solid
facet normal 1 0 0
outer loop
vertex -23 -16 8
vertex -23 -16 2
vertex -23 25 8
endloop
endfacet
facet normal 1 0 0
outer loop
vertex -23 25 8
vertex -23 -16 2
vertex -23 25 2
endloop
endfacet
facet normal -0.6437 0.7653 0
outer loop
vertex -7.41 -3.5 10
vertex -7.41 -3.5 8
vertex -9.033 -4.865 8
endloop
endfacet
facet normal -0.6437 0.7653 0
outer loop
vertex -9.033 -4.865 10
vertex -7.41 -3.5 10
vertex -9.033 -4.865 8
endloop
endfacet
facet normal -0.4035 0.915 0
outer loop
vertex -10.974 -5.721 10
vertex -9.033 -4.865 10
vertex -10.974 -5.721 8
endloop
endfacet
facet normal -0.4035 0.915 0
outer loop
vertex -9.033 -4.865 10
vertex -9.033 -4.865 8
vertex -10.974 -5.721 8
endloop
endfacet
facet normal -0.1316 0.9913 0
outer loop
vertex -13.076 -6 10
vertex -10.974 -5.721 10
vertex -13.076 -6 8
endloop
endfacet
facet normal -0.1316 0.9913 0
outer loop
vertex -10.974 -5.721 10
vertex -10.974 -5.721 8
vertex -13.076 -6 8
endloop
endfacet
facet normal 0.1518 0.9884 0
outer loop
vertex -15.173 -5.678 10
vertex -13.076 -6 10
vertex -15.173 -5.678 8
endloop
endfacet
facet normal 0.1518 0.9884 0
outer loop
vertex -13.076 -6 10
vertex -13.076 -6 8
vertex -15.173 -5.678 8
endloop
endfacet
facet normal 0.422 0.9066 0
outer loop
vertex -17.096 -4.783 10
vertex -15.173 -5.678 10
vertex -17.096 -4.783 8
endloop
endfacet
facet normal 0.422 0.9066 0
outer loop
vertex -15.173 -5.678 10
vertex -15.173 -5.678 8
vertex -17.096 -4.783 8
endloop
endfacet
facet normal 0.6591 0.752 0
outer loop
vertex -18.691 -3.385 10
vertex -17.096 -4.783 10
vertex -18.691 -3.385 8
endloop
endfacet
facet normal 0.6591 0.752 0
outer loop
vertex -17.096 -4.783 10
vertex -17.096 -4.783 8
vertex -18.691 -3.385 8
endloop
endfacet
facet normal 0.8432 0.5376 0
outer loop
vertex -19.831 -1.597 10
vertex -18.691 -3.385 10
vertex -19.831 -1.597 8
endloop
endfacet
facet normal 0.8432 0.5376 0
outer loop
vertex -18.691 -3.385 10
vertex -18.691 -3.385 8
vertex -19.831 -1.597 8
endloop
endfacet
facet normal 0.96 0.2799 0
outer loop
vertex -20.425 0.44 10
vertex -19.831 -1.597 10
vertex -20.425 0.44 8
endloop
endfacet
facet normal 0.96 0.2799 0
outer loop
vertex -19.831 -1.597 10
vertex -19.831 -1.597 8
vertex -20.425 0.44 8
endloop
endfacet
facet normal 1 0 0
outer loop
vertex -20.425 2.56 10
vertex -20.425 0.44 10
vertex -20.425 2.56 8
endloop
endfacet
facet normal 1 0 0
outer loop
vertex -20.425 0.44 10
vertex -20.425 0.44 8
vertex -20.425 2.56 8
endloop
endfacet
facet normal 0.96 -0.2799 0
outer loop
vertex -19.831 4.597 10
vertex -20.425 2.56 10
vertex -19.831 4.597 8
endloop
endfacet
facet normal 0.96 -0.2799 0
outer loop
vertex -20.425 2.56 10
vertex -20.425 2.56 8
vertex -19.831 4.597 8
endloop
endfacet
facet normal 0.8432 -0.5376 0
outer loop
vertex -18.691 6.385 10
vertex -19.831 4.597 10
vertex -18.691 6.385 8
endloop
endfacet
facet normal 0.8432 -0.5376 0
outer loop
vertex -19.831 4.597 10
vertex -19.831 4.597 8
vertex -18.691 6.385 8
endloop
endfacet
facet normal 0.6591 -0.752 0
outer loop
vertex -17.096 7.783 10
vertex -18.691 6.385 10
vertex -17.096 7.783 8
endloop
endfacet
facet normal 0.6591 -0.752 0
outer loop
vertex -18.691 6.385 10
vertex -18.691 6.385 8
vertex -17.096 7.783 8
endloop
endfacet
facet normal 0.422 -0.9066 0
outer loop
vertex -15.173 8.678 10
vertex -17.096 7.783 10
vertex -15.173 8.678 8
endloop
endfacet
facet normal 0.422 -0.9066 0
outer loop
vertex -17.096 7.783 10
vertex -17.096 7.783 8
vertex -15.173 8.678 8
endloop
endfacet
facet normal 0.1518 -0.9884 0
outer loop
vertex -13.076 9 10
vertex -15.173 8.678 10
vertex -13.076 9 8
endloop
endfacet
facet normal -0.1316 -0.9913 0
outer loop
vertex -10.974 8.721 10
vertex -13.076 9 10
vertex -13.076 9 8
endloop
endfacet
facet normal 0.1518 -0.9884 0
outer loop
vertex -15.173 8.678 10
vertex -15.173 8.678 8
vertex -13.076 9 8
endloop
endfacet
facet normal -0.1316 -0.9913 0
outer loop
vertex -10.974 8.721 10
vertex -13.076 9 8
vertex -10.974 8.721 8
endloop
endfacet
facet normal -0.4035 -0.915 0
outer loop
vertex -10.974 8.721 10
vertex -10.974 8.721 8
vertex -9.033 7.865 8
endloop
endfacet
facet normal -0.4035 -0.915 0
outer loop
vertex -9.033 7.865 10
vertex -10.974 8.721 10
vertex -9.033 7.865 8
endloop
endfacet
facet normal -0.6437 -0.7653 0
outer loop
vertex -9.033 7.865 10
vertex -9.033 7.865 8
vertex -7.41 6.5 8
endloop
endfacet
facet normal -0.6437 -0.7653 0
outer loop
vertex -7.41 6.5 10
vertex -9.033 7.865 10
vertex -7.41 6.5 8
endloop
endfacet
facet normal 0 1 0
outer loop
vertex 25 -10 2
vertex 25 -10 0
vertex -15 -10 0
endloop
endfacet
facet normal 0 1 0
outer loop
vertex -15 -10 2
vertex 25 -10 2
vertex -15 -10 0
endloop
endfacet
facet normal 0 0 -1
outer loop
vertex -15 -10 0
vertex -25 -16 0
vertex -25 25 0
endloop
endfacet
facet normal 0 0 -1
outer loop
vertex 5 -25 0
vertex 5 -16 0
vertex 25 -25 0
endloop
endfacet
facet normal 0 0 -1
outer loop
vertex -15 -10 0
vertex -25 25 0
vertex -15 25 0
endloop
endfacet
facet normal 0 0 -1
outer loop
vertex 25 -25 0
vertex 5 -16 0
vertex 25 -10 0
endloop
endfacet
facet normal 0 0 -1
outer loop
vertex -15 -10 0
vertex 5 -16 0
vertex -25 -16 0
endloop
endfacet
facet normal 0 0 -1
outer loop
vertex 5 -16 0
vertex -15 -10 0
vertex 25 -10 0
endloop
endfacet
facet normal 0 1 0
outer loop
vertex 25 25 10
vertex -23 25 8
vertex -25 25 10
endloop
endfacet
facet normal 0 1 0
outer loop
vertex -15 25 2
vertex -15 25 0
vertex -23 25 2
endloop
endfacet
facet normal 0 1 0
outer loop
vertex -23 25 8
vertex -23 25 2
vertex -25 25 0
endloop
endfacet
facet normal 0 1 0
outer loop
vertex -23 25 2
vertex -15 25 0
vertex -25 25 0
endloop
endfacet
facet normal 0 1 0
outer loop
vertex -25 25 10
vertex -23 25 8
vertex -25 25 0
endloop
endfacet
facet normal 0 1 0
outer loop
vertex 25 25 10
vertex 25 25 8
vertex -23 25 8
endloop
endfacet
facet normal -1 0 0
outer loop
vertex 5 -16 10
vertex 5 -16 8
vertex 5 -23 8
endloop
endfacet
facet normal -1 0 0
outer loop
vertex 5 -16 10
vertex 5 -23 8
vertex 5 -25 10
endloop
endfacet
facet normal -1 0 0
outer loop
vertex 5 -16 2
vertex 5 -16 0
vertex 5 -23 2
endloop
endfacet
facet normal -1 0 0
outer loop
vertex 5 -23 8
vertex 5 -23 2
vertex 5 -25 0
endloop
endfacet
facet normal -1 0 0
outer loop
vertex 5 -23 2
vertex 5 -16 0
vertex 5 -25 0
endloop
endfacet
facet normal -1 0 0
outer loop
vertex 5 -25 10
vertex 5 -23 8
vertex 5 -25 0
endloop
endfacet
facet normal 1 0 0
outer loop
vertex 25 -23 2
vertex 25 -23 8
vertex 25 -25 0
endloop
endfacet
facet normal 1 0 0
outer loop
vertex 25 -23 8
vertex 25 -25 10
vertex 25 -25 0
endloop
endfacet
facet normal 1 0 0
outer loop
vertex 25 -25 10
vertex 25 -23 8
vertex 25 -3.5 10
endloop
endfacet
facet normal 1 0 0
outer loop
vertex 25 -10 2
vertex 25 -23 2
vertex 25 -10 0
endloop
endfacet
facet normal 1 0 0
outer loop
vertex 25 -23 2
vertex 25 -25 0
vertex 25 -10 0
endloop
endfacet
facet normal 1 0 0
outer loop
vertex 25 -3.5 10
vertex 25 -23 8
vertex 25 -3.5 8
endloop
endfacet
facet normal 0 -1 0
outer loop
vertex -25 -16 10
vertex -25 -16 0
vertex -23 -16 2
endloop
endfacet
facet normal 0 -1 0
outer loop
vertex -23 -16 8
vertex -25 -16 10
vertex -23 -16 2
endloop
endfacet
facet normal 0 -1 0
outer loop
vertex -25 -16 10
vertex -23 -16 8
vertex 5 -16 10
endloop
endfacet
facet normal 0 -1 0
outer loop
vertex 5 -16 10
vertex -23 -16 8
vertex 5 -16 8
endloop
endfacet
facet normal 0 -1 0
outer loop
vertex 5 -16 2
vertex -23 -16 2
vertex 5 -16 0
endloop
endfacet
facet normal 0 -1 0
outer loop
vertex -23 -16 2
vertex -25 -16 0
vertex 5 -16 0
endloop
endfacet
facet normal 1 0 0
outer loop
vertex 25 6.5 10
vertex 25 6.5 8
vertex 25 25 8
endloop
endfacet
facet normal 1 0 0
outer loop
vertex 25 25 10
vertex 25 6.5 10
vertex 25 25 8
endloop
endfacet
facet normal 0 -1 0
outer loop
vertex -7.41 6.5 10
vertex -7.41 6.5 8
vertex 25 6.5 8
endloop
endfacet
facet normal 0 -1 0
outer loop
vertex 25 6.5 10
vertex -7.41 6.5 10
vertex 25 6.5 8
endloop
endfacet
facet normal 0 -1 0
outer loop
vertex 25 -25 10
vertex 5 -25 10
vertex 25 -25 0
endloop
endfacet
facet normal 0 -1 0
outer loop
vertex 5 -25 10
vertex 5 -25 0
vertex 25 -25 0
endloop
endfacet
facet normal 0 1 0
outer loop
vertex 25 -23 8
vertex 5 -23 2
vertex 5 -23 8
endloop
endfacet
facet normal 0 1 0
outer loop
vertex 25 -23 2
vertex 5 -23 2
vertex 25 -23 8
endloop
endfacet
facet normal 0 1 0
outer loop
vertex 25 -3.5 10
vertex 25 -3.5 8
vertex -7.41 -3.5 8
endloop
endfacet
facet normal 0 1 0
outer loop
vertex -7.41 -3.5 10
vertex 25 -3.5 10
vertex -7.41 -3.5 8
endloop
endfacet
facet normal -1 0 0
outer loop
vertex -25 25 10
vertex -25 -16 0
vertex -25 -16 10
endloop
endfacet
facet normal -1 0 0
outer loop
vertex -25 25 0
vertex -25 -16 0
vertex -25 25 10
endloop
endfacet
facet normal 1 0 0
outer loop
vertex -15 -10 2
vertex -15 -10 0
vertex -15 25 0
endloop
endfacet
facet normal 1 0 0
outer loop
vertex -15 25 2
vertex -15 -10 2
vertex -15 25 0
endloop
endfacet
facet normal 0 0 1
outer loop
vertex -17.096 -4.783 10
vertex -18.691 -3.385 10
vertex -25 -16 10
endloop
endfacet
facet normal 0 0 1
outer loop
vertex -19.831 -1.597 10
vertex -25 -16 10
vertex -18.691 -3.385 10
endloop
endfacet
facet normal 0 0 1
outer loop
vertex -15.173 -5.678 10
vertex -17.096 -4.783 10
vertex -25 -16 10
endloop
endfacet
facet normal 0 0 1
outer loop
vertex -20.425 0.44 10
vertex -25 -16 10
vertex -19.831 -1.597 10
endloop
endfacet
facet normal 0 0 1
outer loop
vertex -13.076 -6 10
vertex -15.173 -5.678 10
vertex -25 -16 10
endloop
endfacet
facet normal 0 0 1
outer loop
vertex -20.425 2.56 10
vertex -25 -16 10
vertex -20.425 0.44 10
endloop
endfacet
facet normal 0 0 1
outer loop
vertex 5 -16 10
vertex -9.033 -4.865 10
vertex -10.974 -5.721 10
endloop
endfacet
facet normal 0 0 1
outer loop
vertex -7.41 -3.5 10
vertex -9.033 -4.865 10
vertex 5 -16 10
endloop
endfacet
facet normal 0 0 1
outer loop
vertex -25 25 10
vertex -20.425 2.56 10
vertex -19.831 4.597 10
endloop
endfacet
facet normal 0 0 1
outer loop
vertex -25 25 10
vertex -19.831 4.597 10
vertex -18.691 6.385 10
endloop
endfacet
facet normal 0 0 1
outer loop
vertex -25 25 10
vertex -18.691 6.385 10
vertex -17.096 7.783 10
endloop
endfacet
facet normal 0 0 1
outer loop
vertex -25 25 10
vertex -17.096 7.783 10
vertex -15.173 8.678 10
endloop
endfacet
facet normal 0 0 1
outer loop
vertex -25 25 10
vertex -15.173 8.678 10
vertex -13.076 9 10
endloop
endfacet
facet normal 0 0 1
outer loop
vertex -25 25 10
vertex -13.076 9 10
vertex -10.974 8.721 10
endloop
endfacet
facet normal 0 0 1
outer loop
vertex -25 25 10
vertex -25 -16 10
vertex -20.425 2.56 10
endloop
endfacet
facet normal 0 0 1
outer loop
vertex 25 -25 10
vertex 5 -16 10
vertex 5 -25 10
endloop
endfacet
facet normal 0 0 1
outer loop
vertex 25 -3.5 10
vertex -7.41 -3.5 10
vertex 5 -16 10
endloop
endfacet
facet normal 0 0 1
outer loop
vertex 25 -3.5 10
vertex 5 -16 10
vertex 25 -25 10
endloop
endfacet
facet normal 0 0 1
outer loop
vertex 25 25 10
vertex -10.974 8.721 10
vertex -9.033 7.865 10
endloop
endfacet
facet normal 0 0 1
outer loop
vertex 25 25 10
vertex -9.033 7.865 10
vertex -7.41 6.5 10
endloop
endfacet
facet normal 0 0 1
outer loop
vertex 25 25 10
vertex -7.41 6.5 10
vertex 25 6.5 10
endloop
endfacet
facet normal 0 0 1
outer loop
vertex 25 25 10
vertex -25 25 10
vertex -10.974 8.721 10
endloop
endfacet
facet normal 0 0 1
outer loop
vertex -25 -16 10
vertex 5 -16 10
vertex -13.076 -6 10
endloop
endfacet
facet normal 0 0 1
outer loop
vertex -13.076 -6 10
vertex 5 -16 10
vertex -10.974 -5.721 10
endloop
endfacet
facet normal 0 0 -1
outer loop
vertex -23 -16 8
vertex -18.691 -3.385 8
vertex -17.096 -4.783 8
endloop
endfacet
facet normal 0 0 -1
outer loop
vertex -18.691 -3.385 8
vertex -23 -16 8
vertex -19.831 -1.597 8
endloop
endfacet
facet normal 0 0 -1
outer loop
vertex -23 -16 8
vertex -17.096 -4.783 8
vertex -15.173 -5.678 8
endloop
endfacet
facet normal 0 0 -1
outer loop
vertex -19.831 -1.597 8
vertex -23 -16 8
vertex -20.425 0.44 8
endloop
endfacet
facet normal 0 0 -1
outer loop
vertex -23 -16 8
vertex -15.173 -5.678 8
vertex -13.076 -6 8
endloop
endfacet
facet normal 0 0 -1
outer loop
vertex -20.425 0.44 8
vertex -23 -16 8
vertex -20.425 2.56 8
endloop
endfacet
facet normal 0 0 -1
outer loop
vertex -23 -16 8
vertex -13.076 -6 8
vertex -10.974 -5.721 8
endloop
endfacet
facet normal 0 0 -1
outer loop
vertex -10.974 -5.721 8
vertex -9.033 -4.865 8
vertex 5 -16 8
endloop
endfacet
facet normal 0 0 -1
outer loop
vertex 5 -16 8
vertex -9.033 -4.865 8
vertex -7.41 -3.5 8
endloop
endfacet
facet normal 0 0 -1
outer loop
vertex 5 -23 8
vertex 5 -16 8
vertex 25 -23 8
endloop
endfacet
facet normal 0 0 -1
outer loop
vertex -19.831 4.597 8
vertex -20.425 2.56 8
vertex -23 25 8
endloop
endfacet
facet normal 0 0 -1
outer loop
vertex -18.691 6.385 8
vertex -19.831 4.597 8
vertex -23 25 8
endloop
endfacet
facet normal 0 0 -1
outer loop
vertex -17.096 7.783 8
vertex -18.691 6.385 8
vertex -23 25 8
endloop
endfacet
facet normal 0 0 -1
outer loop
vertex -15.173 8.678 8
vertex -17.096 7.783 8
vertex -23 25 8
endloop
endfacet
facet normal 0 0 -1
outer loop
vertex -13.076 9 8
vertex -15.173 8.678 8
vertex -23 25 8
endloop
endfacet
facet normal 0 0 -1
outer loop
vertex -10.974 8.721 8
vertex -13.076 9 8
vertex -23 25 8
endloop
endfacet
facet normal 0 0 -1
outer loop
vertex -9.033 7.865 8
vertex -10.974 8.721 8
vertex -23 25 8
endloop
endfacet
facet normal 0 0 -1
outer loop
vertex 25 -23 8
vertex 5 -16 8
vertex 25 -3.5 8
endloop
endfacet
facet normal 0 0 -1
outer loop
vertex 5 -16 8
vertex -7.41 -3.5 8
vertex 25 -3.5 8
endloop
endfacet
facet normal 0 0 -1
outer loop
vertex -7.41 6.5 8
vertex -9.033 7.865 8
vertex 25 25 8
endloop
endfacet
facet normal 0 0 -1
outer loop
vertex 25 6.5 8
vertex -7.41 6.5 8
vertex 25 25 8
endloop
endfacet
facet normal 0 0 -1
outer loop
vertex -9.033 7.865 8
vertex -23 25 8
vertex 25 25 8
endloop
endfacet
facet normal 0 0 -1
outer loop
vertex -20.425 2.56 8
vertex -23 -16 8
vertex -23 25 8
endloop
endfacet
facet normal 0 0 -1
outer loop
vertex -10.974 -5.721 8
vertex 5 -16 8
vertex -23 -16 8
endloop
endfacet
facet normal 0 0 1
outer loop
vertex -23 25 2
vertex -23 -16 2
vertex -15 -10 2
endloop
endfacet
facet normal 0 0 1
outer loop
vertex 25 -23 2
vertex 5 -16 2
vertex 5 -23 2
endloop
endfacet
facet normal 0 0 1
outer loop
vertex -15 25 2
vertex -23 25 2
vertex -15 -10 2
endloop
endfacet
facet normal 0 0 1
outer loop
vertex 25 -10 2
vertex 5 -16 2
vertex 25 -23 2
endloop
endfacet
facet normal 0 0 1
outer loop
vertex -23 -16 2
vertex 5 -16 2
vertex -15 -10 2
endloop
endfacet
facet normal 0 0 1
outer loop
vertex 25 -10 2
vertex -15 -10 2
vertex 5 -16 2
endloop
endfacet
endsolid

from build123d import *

# Parameters (mm, degrees)
F1_DEPTH = 2
F2_W     = 20
F2_H     = 2
F2_W_2   = 2
F2_H_2   = 41
F3_DEPTH = 6
F4_W     = 2
F4_H     = 41
F5_DEPTH = 2


with BuildPart() as f1:
    # F0 (on Top) → F1 (new body)
    with BuildSketch(Plane.XY):
        Polygon((-15, 25), (-25, 25), (-25, -16), (5, -16), (5, -25), (25, -25), (25, -10), (-15, -10), align=None)
    extrude(amount=F1_DEPTH)

    # F2 (on face) → F3 (join)
    with BuildSketch(Plane.XY.offset(2)):
        with Locations((15, -24)):
            Rectangle(F2_W, F2_H)
        with Locations((-24, 4.5)):
            Rectangle(F2_W_2, F2_H_2)
    extrude(amount=F3_DEPTH)

    # F4 (on face) → F5 (join)
    with BuildSketch(Plane.XY.offset(8)):
        with Locations((-24, 4.5)):
            Rectangle(F4_W, F4_H)
        with BuildLine():
            Line((25, 25), (-23, 25))
            Line((-23, 25), (-23, -16))
            Line((-23, -16), (5, -16))
            Line((5, -16), (5, -25))
            Line((5, -25), (25, -25))
            Line((25, -25), (25, -3.5))
            Line((25, -3.5), (-7.4098300563, -3.5))
            ThreePointArc((-7.4098300563, -3.5), (-20.5, 1.5), (-7.4098300563, 6.5))
            Line((-7.4098300563, 6.5), (25, 6.5))
            Line((25, 6.5), (25, 25))
        make_face()
    extrude(amount=F5_DEPTH)


solid = f1.part
